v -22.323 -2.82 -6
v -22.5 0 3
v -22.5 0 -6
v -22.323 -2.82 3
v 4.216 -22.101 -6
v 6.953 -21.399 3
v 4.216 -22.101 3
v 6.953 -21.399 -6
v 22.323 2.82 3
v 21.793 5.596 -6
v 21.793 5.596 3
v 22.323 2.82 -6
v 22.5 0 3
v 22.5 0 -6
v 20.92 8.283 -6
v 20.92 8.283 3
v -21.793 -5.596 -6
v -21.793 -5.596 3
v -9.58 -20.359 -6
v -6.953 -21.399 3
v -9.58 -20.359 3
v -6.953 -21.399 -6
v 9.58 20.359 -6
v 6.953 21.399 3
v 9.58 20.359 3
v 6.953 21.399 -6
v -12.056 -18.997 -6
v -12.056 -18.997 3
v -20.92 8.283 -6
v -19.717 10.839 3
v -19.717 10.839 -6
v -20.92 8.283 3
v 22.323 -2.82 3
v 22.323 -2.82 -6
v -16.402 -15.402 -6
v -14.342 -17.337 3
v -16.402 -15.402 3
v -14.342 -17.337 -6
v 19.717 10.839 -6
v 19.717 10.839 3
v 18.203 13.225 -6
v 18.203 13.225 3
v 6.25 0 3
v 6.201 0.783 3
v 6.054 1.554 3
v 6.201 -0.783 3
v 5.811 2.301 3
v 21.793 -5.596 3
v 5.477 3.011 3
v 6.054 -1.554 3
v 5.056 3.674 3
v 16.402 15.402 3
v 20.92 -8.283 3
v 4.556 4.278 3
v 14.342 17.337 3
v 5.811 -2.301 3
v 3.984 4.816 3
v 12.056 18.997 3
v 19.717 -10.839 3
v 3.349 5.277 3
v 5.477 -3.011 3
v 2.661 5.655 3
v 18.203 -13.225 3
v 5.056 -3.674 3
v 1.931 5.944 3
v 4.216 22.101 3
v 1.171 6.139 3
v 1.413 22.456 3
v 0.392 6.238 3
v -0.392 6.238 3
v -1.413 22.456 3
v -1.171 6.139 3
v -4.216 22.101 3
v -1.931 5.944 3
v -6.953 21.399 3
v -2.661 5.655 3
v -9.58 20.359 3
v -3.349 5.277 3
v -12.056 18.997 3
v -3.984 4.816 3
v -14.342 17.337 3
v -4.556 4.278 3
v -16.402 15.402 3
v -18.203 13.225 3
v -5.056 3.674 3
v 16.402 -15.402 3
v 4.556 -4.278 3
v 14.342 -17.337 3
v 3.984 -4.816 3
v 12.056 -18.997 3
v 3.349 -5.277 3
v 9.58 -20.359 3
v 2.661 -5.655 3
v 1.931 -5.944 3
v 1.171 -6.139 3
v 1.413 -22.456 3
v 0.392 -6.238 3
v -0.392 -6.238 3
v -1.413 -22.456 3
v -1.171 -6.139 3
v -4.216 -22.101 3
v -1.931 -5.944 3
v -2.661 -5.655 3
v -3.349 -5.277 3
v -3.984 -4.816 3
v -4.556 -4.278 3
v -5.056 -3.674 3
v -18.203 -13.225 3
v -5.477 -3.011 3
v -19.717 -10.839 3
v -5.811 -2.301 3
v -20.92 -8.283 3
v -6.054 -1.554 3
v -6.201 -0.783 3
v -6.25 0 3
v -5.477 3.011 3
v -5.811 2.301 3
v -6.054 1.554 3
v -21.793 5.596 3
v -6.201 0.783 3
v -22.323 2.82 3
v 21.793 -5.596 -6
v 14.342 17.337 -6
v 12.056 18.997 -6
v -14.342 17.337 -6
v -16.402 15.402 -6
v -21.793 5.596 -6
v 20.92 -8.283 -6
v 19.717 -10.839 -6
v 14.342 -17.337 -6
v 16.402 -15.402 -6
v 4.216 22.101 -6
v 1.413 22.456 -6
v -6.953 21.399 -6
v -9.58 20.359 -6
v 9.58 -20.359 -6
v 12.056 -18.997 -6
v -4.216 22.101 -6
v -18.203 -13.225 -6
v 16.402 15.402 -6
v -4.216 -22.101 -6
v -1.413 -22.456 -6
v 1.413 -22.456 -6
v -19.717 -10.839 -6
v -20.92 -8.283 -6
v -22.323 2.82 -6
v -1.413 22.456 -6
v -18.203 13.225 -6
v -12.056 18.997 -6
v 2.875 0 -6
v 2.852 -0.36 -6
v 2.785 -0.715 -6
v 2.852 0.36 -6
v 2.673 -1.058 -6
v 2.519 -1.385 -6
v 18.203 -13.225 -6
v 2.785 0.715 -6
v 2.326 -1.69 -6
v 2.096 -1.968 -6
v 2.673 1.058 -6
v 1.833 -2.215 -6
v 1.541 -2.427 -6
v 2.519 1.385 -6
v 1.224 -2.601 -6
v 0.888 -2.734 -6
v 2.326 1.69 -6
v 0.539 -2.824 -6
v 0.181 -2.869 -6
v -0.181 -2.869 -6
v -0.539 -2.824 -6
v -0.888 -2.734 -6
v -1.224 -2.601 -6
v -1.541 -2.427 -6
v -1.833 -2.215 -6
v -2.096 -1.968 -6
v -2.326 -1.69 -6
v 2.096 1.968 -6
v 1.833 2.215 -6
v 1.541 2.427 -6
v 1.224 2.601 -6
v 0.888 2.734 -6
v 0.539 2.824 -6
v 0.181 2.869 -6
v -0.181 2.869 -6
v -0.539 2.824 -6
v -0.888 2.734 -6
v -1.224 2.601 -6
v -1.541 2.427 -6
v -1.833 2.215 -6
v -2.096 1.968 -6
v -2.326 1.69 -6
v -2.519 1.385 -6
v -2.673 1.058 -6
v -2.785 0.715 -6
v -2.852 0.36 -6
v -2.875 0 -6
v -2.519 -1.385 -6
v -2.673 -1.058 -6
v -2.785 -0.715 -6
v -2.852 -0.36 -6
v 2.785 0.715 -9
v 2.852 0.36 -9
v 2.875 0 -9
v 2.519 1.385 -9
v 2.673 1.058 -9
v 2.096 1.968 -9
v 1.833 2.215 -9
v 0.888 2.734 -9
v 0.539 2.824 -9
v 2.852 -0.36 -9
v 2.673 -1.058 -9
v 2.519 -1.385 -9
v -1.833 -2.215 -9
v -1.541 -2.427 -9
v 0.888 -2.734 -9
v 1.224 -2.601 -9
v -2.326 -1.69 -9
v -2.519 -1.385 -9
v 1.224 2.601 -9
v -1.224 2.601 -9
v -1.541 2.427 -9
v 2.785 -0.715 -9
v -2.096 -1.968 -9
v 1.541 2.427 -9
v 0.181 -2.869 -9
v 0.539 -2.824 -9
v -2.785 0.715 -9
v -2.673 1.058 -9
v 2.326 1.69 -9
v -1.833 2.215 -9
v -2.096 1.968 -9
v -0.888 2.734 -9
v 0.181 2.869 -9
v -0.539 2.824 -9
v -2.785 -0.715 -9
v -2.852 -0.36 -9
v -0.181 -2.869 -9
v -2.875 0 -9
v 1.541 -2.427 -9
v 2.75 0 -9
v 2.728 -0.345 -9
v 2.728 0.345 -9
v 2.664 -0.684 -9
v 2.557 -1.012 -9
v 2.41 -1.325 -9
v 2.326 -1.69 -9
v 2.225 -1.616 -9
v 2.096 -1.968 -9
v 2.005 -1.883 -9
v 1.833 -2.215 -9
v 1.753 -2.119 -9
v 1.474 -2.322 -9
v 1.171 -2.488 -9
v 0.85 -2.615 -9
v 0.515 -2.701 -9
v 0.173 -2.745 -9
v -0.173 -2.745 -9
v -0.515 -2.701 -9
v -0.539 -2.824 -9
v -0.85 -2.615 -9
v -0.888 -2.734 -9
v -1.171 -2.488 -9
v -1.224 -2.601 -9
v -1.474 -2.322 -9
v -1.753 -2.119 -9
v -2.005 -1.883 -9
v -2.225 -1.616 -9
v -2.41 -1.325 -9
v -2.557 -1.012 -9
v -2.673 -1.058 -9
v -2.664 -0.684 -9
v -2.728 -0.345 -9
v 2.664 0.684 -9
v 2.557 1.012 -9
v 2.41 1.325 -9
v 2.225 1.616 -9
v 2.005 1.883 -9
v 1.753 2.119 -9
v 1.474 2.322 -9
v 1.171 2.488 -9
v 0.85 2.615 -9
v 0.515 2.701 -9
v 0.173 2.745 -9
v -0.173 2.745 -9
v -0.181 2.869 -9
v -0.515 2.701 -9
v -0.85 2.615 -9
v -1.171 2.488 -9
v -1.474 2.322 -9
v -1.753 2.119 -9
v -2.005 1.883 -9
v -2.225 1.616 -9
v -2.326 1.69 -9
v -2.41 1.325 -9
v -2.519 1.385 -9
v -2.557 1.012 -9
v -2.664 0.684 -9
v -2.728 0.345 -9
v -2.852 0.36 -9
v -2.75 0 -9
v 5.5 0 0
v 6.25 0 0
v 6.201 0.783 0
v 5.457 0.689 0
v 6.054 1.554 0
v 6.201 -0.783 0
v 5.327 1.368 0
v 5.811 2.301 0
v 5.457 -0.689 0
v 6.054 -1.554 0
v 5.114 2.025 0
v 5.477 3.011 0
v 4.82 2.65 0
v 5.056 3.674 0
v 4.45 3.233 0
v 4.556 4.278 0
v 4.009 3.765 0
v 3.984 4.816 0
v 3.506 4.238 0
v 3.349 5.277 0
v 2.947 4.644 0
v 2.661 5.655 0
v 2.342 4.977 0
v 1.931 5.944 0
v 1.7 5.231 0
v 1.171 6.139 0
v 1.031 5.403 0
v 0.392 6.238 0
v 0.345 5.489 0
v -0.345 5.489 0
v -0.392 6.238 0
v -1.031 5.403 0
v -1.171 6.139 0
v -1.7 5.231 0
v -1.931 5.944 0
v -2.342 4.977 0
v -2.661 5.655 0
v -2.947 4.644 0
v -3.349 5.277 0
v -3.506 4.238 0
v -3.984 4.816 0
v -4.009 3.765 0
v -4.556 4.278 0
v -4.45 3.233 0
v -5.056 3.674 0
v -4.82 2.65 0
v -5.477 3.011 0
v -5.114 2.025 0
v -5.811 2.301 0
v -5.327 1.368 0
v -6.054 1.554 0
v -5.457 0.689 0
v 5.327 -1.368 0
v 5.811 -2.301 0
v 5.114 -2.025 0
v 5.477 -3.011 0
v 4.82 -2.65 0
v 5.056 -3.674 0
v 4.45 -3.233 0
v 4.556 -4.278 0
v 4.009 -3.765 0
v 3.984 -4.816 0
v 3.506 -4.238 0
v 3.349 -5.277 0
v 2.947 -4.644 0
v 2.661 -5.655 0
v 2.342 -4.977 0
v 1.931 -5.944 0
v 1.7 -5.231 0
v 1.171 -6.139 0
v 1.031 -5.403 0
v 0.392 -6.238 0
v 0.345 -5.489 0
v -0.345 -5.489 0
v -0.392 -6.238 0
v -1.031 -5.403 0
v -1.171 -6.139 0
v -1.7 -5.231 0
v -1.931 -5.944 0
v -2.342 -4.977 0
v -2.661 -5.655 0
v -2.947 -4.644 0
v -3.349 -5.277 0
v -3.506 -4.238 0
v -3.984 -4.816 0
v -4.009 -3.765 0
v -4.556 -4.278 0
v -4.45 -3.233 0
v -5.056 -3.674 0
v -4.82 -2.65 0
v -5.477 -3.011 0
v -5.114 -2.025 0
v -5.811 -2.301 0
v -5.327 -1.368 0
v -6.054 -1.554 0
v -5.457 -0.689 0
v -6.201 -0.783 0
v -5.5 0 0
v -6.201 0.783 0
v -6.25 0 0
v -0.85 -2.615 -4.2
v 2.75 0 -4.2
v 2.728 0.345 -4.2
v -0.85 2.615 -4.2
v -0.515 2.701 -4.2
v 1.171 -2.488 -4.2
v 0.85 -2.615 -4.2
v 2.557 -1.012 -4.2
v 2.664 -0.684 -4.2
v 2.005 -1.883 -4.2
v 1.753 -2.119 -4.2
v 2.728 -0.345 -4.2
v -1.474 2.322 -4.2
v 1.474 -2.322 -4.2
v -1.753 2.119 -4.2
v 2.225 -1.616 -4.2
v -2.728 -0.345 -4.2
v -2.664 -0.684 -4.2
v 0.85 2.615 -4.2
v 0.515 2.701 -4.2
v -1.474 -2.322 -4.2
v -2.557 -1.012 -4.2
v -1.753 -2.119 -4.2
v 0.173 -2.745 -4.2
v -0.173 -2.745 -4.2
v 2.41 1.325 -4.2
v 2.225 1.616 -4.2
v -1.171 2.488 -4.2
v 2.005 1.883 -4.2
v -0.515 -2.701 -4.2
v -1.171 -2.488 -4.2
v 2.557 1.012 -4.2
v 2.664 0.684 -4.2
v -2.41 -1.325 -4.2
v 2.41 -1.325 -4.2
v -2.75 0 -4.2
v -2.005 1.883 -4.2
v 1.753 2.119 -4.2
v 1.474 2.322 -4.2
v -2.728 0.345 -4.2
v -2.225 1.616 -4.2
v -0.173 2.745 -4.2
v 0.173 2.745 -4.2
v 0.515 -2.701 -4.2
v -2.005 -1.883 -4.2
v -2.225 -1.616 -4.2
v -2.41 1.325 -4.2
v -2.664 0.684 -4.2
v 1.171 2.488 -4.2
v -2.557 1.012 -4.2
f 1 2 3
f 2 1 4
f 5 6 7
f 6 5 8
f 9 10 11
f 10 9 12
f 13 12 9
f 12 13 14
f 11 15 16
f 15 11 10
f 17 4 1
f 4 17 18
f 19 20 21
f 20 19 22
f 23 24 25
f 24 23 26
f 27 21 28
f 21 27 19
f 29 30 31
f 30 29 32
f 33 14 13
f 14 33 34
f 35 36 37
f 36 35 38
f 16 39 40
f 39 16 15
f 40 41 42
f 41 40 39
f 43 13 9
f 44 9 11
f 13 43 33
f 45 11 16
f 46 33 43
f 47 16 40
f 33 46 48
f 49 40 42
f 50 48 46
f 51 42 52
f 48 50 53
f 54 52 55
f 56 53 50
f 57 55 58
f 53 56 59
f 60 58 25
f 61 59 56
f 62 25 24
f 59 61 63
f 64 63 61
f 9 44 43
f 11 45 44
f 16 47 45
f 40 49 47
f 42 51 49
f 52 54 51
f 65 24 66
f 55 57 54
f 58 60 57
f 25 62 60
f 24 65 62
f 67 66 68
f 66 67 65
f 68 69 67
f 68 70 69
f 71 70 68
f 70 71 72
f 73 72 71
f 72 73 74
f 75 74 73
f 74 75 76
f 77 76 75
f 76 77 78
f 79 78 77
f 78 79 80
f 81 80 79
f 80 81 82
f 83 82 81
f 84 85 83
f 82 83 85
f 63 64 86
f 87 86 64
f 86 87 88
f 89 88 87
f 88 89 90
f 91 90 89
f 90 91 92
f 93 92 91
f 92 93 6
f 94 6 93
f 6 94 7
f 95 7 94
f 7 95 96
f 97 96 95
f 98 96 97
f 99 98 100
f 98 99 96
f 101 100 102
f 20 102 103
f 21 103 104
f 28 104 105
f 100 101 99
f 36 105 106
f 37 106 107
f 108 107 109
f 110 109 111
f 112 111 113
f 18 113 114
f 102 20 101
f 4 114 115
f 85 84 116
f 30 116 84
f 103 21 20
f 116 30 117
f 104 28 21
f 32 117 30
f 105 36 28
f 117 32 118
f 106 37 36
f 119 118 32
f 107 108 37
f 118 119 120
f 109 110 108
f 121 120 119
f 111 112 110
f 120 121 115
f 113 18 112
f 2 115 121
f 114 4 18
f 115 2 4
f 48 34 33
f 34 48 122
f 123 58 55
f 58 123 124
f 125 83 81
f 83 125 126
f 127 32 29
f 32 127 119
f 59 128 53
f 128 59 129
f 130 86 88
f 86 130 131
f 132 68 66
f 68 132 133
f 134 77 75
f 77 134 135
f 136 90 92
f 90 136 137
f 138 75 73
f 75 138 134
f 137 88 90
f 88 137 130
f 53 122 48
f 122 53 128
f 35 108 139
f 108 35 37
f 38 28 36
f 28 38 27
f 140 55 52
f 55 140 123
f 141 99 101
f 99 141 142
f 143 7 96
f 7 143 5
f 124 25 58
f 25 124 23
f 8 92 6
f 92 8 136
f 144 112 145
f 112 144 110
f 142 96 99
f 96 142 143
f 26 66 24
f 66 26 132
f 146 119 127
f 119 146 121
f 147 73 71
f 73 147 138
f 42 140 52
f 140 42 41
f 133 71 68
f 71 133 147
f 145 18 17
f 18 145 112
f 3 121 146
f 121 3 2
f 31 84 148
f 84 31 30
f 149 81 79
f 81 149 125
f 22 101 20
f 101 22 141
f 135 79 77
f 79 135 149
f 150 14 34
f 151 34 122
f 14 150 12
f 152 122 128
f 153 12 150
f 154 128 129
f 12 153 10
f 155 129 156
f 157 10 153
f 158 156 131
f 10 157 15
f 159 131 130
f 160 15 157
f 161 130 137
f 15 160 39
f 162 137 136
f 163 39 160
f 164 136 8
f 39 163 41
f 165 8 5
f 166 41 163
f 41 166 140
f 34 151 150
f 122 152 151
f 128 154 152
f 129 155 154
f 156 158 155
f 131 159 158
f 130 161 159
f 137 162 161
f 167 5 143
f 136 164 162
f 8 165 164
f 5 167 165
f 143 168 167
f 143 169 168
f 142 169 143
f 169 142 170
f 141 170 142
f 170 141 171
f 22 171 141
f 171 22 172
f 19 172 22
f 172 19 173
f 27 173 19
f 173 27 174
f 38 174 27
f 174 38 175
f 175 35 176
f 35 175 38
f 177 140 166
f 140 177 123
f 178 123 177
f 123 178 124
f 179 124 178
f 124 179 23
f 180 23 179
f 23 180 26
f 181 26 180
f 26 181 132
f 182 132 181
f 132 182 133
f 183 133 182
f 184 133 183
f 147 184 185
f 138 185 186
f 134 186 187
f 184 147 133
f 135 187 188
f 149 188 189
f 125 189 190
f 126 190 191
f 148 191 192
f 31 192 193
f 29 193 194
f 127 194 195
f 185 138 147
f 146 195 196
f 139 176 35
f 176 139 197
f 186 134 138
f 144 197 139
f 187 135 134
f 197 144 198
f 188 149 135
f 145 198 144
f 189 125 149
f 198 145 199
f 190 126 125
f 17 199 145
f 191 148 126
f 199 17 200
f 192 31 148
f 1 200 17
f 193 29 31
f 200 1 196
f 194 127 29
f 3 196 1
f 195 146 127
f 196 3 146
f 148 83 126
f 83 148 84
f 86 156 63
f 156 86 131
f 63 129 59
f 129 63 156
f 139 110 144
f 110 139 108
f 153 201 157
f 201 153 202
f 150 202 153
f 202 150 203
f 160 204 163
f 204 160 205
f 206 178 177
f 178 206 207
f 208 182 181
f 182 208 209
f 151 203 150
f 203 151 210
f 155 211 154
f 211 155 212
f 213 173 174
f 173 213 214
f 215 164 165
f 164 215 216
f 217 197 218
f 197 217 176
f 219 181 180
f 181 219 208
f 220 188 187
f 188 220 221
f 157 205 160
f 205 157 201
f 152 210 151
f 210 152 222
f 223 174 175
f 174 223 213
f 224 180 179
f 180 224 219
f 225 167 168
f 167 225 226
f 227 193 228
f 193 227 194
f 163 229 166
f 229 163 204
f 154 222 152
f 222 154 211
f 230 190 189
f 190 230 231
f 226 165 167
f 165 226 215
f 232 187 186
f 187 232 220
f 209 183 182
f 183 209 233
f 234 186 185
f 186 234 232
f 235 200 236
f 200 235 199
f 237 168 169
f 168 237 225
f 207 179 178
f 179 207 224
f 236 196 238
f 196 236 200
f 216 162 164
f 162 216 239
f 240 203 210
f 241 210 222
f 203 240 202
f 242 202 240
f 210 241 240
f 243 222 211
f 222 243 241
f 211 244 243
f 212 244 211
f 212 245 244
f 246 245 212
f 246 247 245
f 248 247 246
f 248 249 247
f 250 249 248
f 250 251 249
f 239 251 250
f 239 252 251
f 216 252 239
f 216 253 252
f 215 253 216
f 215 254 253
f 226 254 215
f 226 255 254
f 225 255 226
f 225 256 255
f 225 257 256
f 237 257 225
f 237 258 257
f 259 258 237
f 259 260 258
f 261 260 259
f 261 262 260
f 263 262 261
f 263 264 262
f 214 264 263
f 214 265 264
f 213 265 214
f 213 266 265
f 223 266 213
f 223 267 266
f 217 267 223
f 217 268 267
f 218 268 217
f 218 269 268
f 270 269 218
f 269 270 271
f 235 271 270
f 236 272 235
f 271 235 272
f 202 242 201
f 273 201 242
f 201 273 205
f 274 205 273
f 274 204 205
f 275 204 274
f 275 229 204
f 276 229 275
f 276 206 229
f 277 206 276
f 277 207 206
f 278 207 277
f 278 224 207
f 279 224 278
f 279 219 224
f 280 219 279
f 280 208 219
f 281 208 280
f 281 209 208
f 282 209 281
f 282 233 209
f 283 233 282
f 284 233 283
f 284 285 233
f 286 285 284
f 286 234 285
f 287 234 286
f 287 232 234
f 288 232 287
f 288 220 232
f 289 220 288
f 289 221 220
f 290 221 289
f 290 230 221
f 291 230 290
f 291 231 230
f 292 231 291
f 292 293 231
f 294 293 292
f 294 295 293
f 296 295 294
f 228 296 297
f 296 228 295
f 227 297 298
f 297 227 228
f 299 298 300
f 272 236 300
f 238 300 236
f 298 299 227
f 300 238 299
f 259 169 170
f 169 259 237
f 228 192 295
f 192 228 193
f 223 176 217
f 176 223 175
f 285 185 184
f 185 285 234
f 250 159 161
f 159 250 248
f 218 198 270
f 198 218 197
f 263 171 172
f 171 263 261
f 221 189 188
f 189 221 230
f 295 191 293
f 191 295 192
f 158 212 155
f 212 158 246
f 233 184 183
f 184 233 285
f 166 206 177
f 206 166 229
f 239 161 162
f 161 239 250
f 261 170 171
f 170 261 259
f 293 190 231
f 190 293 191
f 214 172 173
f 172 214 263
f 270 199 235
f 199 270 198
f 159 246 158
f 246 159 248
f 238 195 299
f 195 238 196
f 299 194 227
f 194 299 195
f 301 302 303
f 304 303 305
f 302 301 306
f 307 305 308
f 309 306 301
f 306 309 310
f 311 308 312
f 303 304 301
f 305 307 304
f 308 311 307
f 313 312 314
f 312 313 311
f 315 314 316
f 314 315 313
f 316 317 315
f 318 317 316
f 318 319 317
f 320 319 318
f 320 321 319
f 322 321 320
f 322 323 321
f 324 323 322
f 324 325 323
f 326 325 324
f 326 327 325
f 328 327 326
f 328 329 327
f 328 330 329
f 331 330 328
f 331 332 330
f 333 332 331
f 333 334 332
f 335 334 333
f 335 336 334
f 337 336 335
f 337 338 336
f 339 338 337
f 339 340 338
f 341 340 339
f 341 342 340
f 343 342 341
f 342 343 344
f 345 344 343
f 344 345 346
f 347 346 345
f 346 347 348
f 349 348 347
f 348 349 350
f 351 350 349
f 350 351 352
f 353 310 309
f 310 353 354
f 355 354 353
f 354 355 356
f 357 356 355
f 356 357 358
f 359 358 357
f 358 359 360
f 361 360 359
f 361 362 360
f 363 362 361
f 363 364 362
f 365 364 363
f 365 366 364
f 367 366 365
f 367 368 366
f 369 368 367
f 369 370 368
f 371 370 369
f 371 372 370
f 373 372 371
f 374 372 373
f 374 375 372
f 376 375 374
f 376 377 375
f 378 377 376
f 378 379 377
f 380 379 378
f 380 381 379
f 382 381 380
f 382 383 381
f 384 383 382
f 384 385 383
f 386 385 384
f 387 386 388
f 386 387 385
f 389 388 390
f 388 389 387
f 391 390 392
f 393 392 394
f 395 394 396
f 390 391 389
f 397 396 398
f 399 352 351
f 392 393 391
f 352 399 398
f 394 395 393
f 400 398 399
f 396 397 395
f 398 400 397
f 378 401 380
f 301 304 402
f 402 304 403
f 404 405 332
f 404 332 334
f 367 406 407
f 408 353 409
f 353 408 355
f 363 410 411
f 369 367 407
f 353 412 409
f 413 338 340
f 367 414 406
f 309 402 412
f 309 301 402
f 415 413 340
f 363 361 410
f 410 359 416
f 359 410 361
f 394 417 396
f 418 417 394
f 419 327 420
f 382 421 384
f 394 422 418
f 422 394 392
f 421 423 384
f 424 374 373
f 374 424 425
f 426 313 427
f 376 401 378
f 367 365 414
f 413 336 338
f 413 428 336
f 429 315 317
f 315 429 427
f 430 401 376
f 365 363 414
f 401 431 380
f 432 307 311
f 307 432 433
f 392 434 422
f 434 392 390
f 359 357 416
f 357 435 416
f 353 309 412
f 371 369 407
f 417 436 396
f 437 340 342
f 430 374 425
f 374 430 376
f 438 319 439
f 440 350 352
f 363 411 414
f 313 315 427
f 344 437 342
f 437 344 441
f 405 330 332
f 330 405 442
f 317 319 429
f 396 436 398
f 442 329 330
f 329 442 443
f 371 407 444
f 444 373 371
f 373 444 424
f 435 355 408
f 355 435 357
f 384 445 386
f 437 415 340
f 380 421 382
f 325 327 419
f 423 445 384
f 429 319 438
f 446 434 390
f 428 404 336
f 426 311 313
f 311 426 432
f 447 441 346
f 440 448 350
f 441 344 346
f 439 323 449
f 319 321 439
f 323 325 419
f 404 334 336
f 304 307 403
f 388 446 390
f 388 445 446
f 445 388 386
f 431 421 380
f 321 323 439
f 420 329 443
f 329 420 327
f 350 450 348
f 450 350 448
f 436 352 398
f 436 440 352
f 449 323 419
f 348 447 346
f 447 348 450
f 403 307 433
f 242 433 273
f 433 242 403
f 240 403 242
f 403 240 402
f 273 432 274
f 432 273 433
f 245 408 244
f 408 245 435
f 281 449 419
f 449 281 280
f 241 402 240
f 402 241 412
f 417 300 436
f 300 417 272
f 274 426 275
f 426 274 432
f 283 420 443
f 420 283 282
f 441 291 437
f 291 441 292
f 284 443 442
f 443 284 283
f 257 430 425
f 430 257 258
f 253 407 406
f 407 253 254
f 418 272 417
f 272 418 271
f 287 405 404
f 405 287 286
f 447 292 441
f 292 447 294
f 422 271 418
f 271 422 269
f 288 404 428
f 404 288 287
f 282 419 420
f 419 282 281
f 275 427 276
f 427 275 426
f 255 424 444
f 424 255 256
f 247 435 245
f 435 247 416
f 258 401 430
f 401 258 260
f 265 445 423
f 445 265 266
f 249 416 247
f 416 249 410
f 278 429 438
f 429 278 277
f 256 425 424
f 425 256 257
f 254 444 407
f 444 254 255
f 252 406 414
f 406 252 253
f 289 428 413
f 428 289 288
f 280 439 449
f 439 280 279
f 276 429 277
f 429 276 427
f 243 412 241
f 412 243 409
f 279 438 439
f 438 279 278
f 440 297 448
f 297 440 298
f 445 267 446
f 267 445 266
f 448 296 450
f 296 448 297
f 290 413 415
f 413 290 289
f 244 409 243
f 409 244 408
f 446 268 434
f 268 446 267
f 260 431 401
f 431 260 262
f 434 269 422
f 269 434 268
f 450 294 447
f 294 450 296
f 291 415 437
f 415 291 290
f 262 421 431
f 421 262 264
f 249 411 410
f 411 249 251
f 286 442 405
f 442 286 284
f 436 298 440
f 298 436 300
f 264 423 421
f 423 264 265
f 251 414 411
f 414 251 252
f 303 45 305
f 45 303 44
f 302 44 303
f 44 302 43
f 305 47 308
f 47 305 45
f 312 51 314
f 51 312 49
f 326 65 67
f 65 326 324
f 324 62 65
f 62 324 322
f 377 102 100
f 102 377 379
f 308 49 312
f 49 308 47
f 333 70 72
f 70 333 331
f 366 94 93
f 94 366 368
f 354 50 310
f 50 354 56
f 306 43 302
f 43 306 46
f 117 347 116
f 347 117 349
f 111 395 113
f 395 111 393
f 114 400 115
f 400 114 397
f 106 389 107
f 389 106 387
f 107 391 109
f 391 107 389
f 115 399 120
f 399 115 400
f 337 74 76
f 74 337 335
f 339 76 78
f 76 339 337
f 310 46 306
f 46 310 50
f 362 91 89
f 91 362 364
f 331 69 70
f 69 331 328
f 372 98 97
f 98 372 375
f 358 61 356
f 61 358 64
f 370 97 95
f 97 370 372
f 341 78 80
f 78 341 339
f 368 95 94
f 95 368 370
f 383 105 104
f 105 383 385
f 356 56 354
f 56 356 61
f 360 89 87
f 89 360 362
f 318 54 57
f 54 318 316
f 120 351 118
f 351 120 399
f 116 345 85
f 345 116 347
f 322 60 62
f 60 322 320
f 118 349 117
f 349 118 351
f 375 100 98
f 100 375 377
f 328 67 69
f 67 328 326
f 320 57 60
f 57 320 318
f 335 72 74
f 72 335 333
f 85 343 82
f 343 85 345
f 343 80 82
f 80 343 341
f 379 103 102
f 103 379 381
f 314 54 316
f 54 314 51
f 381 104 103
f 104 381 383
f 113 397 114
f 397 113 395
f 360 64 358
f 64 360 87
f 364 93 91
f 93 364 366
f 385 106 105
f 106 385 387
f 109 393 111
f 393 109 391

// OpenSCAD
$fn = 50;

difference() {
	union() {
		translate(v = [0, 0, -6.0]) {
			cylinder(h = 9, r = 22.5);
		}
		#translate(v = [0, 0, -9.0]) {
			cylinder(h = 9, r = 2.875);
		}
	}
	union() {
		translate(v = [0, 0, 0]) {
			rotate(a = [0, 0, 0]) {
				difference() {
					union() {
						translate(v = [0, 0, -9.0]) {
							cylinder(h = 9, r = 2.25);
						}
						translate(v = [0, 0, -4.2]) {
							cylinder(h = 4.2, r1 = 2.75, r2 = 5.5);
						}
						translate(v = [0, 0, -9.0]) {
							cylinder(h = 9, r = 2.75);
						}
						translate(v = [0, 0, -9.0]) {
							cylinder(h = 9, r = 2.25);
						}
					}
					union();
				}
			}
		}
		#cylinder(h = 3, r = 6.25);
	}
}
